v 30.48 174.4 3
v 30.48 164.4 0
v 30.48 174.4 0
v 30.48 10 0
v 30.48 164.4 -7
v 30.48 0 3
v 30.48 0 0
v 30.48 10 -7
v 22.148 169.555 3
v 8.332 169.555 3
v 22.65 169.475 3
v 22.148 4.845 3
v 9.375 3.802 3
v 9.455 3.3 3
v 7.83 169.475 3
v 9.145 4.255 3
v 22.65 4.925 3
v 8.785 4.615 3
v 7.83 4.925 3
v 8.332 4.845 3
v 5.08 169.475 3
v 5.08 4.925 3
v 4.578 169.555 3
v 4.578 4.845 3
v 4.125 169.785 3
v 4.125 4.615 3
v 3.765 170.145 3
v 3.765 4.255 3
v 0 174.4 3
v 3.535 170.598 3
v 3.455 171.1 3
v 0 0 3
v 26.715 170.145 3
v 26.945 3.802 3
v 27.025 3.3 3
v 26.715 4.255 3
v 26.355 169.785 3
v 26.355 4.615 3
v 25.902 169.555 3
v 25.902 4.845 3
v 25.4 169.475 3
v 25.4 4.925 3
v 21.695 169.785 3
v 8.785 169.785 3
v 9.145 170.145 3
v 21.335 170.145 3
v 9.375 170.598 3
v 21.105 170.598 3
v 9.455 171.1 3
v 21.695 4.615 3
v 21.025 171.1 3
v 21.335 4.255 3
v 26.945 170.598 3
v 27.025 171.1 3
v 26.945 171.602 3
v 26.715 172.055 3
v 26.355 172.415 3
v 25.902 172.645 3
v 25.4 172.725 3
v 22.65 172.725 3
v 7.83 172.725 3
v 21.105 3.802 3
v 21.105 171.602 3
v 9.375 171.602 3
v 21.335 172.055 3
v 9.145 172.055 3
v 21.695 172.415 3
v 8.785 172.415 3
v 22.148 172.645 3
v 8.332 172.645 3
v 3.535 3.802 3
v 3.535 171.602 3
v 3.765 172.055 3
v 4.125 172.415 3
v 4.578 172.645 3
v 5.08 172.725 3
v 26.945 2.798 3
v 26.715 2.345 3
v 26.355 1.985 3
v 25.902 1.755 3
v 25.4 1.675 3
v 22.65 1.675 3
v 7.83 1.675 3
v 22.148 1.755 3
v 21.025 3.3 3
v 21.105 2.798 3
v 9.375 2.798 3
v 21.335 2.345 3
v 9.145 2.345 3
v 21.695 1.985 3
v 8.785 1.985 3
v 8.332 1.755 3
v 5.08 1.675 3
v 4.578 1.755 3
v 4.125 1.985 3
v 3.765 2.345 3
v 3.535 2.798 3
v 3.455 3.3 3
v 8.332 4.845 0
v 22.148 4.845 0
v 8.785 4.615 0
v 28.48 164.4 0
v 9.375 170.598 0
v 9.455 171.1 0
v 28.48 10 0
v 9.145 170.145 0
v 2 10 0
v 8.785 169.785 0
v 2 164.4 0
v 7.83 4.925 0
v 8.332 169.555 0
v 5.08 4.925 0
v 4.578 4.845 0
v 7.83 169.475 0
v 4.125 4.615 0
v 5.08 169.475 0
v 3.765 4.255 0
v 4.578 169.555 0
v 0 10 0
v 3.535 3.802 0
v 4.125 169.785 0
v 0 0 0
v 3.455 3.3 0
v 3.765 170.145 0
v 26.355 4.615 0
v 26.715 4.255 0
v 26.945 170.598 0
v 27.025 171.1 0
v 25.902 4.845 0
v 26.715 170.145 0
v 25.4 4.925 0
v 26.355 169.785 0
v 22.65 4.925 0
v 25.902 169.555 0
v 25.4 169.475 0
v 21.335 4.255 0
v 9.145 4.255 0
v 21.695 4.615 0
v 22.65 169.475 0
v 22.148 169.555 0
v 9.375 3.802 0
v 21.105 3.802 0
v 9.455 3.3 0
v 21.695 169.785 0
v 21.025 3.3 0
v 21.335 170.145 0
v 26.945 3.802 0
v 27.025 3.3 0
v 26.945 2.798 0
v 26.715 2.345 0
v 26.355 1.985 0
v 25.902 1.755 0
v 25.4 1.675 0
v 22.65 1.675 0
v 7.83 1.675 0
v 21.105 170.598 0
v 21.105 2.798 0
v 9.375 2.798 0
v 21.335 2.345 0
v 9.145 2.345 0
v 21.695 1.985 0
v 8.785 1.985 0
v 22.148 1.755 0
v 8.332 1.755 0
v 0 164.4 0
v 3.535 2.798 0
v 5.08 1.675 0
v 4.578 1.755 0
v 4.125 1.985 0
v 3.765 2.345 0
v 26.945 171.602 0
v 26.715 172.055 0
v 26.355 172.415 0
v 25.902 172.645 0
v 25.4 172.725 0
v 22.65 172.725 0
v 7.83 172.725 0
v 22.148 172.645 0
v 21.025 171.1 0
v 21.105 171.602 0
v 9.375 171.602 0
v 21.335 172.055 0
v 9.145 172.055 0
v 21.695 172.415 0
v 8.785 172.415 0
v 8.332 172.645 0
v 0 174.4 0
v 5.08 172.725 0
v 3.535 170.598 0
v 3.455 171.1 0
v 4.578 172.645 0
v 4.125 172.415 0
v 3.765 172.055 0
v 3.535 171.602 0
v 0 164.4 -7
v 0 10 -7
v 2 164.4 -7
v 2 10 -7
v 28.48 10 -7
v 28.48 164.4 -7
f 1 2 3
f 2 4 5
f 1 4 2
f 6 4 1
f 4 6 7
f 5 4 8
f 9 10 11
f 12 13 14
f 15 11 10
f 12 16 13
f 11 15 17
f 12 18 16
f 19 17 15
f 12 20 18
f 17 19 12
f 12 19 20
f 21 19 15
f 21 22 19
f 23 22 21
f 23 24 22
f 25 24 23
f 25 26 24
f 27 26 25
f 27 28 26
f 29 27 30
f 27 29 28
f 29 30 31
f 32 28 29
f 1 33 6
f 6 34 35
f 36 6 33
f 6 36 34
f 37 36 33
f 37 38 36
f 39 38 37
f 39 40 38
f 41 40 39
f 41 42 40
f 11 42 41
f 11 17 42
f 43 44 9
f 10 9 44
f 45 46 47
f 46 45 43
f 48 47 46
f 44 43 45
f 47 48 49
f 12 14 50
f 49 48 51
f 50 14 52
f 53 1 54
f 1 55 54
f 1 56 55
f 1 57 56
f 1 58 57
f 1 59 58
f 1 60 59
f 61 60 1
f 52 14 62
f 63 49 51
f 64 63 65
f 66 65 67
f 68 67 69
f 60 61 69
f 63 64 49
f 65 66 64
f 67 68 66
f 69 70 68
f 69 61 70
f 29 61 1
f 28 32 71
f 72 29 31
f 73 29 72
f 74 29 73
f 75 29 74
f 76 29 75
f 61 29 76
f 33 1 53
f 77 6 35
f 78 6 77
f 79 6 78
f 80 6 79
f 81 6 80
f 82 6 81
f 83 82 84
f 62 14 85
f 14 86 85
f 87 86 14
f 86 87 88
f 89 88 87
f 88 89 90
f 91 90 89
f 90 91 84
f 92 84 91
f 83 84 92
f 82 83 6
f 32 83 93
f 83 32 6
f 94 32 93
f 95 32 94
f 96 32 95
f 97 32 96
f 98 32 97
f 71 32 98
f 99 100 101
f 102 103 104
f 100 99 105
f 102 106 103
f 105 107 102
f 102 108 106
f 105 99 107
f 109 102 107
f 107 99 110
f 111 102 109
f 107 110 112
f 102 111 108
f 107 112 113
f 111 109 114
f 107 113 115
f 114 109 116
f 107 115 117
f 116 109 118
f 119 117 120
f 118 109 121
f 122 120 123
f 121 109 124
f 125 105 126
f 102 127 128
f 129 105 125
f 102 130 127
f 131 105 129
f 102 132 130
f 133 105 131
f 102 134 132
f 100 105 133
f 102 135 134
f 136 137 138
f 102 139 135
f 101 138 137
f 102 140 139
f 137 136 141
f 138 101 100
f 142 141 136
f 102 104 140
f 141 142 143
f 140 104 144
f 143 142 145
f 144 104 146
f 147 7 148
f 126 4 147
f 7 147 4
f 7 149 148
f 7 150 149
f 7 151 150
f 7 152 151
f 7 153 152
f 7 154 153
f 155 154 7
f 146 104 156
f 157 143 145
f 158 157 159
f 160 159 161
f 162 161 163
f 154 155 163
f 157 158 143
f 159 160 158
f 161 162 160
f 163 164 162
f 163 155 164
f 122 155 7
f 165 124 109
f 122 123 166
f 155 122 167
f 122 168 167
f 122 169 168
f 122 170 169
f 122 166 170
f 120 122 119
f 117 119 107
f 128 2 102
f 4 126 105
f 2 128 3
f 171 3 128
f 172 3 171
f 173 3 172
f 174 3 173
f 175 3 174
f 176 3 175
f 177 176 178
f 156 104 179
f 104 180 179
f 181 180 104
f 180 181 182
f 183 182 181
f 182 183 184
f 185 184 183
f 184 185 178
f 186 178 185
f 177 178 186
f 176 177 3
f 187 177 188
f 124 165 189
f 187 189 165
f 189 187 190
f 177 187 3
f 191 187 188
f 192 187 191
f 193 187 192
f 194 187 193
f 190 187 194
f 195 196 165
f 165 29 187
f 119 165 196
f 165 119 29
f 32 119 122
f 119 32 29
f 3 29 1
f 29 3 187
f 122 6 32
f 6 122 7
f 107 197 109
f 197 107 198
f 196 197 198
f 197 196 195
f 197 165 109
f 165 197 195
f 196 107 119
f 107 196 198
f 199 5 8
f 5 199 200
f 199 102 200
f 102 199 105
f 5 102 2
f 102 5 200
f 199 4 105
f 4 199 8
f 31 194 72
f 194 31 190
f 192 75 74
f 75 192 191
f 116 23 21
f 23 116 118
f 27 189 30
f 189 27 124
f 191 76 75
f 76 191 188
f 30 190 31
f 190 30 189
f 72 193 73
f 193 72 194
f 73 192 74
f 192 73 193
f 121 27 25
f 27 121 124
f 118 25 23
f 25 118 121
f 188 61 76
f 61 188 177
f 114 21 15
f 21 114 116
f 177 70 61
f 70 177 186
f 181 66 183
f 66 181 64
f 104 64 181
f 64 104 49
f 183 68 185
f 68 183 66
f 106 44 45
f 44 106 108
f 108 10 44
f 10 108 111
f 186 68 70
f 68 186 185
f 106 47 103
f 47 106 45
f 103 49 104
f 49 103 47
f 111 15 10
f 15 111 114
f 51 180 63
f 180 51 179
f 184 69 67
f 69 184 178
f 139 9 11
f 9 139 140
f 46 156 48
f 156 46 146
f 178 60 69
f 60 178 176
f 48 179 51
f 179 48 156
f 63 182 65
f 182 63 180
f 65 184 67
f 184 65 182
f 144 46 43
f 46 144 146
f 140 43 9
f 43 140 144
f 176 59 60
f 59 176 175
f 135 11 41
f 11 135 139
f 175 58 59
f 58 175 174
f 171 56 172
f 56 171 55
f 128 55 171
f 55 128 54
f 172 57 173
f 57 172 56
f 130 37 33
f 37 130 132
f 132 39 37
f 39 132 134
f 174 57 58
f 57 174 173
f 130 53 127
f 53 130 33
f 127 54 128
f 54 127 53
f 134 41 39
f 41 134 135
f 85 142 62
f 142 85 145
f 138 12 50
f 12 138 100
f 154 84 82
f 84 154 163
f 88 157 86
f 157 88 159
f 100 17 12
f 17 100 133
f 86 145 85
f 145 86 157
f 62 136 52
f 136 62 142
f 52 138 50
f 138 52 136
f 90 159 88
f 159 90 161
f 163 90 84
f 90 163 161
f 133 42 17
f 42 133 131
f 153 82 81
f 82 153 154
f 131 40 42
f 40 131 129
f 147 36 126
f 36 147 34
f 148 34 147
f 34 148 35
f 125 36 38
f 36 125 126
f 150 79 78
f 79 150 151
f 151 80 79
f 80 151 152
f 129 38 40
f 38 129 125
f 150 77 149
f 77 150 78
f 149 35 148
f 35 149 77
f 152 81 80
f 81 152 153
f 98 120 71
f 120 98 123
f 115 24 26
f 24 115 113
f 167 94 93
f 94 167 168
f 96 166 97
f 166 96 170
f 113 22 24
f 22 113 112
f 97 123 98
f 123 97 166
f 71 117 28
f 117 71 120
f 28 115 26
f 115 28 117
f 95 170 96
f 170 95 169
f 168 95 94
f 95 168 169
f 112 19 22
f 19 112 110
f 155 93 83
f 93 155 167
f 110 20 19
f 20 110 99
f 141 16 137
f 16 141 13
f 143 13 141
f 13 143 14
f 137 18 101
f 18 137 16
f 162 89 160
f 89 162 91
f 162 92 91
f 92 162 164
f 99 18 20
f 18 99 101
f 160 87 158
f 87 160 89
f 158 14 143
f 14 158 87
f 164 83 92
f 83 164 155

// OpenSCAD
// input values
panelU = 4;
panelHp = 6;
panelThickness = 3;
panelEdgeWidth = 2;
panelEdgeThickness = 7;
zRailEdgeHeight = 1.7;
zRailTotalHeight = 10;
holeCount = 4;
holeWidth = 6;
holeDiameter = 3.25;
ignoreMountHoles = false;

// reference values
hp = 5.08;
u = 44.45;

// calculated values
panelUHeight = panelU * u;
totalzRailEdgeHeight = zRailEdgeHeight * 2;
panelActualHeight = panelUHeight - totalzRailEdgeHeight;
panelActualWidth = panelHp * hp;
pcbMaxHeight = panelActualHeight - zRailTotalHeight;
mountHoleRad = holeDiameter / 2;
holeWidthCubeWidth = holeWidth - holeDiameter;
offsetToMountHoleCenterY = (zRailTotalHeight / 2) - zRailEdgeHeight;
offsetToMountHoleCenterX = hp - holeWidthCubeWidth / 2;

echo("-------------------------------");

echo("INPUTS:");
echo("panelU", panelU);
echo("panelHp", panelHp);
echo("panelThickness", panelThickness);
echo("panelEdgeWidth", panelEdgeWidth);
echo("panelEdgeThickness", panelEdgeThickness);
echo("zRailEdgeHeight", zRailEdgeHeight);
echo("zRailTotalHeight", zRailTotalHeight);
if (!ignoreMountHoles)
{
    echo("holeCount", holeCount);
    echo("holeDiameter", holeDiameter);
    echo("holeWidth", holeWidth);
}

echo("-------------------------------");

echo("REFERENCE:");
echo("hp", hp);
echo("u", u);


echo("-------------------------------");

echo("CALCULATED:");
echo("panelUHeight", panelUHeight);
echo("panelActualHeight", panelActualHeight);
echo("panelActualWidth", panelActualWidth);
echo("pcbMaxHeight", pcbMaxHeight);


echo("-------------------------------");

module eurorackPanel()
{
    difference()
    {
        union()
        {
            // panel
            cube([panelActualWidth, panelActualHeight, panelThickness]);
            
            // side rails
            translate([0, zRailTotalHeight, -panelEdgeThickness])
            {
                cube([panelEdgeWidth, panelActualHeight - (2 * zRailTotalHeight), panelEdgeThickness]);
            }
            translate([panelActualWidth - panelEdgeWidth, zRailTotalHeight, -panelEdgeThickness])
            {
                cube([panelEdgeWidth, panelActualHeight - (2 * zRailTotalHeight), panelEdgeThickness]);
            }
        }
        
        // holes
        if(!ignoreMountHoles)
        {
            eurorackMountHoles(holeCount, holeWidth);
        }
    }
}

module eurorackMountHoles(holes, holeWidth)
{
    holes = holes - holes % 2;
    eurorackMountHolesTopRow(holeWidth, holes / 2);
    eurorackMountHolesBottomRow(holeWidth, holes / 2);
}

module eurorackMountHolesTopRow(holeWidth, holes)
{
    
    translate([hp, panelActualHeight - offsetToMountHoleCenterY, 0])
    {
        eurorackMountHole(holeWidth);
    }
    if(holes > 1)
    {
        translate([panelActualWidth - holeWidthCubeWidth - hp, panelActualHeight - offsetToMountHoleCenterY, 0])
        {
            eurorackMountHole(holeWidth);
        }
    }
    if(holes > 2)
    {
        holeDivs = panelActualWidth / (holes - 1);
        for (i = [1 : holes - 2])
        {
            translate([holeDivs * i, panelActualHeight - offsetToMountHoleCenterY , 0])
            {
                eurorackMountHole(holeWidth);
            }
        }
    }
}

module eurorackMountHolesBottomRow(holeWidth, holes)
{
    
    translate([panelActualWidth - holeWidthCubeWidth - hp, offsetToMountHoleCenterY, 0])
    {
        eurorackMountHole(holeWidth);
    }
    if(holes > 1)
    {
        translate([hp, offsetToMountHoleCenterY, 0])
        {
            eurorackMountHole(holeWidth);
        }
    }
    if(holes > 2)
    {
        holeDivs = panelActualWidth / (holes - 1);
        for (i = [1 : holes - 2])
        {
            translate([holeDivs * i, offsetToMountHoleCenterY, 0])
            {
                eurorackMountHole(holeWidth);
            }
        }
    }
}

module eurorackMountHole(holeWidth)
{
    mountHoleDepth = panelThickness + 2;
    
    if(holeWidthCubeWidth < 0)
    {
        holeWidthCubeWidth = 0;
    }
    translate([0, 0, -1])
    {
        union()
        {
            cylinder(r = mountHoleRad, h = mountHoleDepth, $fn = 20);
            translate([0, -mountHoleRad, 0])
            {
                cube([holeWidthCubeWidth, holeDiameter, mountHoleDepth]);
            }
            translate([holeWidthCubeWidth, 0, 0])
            {
                cylinder(r = mountHoleRad, h = mountHoleDepth, $fn = 20);
            }
        }
    }
}

eurorackPanel();
